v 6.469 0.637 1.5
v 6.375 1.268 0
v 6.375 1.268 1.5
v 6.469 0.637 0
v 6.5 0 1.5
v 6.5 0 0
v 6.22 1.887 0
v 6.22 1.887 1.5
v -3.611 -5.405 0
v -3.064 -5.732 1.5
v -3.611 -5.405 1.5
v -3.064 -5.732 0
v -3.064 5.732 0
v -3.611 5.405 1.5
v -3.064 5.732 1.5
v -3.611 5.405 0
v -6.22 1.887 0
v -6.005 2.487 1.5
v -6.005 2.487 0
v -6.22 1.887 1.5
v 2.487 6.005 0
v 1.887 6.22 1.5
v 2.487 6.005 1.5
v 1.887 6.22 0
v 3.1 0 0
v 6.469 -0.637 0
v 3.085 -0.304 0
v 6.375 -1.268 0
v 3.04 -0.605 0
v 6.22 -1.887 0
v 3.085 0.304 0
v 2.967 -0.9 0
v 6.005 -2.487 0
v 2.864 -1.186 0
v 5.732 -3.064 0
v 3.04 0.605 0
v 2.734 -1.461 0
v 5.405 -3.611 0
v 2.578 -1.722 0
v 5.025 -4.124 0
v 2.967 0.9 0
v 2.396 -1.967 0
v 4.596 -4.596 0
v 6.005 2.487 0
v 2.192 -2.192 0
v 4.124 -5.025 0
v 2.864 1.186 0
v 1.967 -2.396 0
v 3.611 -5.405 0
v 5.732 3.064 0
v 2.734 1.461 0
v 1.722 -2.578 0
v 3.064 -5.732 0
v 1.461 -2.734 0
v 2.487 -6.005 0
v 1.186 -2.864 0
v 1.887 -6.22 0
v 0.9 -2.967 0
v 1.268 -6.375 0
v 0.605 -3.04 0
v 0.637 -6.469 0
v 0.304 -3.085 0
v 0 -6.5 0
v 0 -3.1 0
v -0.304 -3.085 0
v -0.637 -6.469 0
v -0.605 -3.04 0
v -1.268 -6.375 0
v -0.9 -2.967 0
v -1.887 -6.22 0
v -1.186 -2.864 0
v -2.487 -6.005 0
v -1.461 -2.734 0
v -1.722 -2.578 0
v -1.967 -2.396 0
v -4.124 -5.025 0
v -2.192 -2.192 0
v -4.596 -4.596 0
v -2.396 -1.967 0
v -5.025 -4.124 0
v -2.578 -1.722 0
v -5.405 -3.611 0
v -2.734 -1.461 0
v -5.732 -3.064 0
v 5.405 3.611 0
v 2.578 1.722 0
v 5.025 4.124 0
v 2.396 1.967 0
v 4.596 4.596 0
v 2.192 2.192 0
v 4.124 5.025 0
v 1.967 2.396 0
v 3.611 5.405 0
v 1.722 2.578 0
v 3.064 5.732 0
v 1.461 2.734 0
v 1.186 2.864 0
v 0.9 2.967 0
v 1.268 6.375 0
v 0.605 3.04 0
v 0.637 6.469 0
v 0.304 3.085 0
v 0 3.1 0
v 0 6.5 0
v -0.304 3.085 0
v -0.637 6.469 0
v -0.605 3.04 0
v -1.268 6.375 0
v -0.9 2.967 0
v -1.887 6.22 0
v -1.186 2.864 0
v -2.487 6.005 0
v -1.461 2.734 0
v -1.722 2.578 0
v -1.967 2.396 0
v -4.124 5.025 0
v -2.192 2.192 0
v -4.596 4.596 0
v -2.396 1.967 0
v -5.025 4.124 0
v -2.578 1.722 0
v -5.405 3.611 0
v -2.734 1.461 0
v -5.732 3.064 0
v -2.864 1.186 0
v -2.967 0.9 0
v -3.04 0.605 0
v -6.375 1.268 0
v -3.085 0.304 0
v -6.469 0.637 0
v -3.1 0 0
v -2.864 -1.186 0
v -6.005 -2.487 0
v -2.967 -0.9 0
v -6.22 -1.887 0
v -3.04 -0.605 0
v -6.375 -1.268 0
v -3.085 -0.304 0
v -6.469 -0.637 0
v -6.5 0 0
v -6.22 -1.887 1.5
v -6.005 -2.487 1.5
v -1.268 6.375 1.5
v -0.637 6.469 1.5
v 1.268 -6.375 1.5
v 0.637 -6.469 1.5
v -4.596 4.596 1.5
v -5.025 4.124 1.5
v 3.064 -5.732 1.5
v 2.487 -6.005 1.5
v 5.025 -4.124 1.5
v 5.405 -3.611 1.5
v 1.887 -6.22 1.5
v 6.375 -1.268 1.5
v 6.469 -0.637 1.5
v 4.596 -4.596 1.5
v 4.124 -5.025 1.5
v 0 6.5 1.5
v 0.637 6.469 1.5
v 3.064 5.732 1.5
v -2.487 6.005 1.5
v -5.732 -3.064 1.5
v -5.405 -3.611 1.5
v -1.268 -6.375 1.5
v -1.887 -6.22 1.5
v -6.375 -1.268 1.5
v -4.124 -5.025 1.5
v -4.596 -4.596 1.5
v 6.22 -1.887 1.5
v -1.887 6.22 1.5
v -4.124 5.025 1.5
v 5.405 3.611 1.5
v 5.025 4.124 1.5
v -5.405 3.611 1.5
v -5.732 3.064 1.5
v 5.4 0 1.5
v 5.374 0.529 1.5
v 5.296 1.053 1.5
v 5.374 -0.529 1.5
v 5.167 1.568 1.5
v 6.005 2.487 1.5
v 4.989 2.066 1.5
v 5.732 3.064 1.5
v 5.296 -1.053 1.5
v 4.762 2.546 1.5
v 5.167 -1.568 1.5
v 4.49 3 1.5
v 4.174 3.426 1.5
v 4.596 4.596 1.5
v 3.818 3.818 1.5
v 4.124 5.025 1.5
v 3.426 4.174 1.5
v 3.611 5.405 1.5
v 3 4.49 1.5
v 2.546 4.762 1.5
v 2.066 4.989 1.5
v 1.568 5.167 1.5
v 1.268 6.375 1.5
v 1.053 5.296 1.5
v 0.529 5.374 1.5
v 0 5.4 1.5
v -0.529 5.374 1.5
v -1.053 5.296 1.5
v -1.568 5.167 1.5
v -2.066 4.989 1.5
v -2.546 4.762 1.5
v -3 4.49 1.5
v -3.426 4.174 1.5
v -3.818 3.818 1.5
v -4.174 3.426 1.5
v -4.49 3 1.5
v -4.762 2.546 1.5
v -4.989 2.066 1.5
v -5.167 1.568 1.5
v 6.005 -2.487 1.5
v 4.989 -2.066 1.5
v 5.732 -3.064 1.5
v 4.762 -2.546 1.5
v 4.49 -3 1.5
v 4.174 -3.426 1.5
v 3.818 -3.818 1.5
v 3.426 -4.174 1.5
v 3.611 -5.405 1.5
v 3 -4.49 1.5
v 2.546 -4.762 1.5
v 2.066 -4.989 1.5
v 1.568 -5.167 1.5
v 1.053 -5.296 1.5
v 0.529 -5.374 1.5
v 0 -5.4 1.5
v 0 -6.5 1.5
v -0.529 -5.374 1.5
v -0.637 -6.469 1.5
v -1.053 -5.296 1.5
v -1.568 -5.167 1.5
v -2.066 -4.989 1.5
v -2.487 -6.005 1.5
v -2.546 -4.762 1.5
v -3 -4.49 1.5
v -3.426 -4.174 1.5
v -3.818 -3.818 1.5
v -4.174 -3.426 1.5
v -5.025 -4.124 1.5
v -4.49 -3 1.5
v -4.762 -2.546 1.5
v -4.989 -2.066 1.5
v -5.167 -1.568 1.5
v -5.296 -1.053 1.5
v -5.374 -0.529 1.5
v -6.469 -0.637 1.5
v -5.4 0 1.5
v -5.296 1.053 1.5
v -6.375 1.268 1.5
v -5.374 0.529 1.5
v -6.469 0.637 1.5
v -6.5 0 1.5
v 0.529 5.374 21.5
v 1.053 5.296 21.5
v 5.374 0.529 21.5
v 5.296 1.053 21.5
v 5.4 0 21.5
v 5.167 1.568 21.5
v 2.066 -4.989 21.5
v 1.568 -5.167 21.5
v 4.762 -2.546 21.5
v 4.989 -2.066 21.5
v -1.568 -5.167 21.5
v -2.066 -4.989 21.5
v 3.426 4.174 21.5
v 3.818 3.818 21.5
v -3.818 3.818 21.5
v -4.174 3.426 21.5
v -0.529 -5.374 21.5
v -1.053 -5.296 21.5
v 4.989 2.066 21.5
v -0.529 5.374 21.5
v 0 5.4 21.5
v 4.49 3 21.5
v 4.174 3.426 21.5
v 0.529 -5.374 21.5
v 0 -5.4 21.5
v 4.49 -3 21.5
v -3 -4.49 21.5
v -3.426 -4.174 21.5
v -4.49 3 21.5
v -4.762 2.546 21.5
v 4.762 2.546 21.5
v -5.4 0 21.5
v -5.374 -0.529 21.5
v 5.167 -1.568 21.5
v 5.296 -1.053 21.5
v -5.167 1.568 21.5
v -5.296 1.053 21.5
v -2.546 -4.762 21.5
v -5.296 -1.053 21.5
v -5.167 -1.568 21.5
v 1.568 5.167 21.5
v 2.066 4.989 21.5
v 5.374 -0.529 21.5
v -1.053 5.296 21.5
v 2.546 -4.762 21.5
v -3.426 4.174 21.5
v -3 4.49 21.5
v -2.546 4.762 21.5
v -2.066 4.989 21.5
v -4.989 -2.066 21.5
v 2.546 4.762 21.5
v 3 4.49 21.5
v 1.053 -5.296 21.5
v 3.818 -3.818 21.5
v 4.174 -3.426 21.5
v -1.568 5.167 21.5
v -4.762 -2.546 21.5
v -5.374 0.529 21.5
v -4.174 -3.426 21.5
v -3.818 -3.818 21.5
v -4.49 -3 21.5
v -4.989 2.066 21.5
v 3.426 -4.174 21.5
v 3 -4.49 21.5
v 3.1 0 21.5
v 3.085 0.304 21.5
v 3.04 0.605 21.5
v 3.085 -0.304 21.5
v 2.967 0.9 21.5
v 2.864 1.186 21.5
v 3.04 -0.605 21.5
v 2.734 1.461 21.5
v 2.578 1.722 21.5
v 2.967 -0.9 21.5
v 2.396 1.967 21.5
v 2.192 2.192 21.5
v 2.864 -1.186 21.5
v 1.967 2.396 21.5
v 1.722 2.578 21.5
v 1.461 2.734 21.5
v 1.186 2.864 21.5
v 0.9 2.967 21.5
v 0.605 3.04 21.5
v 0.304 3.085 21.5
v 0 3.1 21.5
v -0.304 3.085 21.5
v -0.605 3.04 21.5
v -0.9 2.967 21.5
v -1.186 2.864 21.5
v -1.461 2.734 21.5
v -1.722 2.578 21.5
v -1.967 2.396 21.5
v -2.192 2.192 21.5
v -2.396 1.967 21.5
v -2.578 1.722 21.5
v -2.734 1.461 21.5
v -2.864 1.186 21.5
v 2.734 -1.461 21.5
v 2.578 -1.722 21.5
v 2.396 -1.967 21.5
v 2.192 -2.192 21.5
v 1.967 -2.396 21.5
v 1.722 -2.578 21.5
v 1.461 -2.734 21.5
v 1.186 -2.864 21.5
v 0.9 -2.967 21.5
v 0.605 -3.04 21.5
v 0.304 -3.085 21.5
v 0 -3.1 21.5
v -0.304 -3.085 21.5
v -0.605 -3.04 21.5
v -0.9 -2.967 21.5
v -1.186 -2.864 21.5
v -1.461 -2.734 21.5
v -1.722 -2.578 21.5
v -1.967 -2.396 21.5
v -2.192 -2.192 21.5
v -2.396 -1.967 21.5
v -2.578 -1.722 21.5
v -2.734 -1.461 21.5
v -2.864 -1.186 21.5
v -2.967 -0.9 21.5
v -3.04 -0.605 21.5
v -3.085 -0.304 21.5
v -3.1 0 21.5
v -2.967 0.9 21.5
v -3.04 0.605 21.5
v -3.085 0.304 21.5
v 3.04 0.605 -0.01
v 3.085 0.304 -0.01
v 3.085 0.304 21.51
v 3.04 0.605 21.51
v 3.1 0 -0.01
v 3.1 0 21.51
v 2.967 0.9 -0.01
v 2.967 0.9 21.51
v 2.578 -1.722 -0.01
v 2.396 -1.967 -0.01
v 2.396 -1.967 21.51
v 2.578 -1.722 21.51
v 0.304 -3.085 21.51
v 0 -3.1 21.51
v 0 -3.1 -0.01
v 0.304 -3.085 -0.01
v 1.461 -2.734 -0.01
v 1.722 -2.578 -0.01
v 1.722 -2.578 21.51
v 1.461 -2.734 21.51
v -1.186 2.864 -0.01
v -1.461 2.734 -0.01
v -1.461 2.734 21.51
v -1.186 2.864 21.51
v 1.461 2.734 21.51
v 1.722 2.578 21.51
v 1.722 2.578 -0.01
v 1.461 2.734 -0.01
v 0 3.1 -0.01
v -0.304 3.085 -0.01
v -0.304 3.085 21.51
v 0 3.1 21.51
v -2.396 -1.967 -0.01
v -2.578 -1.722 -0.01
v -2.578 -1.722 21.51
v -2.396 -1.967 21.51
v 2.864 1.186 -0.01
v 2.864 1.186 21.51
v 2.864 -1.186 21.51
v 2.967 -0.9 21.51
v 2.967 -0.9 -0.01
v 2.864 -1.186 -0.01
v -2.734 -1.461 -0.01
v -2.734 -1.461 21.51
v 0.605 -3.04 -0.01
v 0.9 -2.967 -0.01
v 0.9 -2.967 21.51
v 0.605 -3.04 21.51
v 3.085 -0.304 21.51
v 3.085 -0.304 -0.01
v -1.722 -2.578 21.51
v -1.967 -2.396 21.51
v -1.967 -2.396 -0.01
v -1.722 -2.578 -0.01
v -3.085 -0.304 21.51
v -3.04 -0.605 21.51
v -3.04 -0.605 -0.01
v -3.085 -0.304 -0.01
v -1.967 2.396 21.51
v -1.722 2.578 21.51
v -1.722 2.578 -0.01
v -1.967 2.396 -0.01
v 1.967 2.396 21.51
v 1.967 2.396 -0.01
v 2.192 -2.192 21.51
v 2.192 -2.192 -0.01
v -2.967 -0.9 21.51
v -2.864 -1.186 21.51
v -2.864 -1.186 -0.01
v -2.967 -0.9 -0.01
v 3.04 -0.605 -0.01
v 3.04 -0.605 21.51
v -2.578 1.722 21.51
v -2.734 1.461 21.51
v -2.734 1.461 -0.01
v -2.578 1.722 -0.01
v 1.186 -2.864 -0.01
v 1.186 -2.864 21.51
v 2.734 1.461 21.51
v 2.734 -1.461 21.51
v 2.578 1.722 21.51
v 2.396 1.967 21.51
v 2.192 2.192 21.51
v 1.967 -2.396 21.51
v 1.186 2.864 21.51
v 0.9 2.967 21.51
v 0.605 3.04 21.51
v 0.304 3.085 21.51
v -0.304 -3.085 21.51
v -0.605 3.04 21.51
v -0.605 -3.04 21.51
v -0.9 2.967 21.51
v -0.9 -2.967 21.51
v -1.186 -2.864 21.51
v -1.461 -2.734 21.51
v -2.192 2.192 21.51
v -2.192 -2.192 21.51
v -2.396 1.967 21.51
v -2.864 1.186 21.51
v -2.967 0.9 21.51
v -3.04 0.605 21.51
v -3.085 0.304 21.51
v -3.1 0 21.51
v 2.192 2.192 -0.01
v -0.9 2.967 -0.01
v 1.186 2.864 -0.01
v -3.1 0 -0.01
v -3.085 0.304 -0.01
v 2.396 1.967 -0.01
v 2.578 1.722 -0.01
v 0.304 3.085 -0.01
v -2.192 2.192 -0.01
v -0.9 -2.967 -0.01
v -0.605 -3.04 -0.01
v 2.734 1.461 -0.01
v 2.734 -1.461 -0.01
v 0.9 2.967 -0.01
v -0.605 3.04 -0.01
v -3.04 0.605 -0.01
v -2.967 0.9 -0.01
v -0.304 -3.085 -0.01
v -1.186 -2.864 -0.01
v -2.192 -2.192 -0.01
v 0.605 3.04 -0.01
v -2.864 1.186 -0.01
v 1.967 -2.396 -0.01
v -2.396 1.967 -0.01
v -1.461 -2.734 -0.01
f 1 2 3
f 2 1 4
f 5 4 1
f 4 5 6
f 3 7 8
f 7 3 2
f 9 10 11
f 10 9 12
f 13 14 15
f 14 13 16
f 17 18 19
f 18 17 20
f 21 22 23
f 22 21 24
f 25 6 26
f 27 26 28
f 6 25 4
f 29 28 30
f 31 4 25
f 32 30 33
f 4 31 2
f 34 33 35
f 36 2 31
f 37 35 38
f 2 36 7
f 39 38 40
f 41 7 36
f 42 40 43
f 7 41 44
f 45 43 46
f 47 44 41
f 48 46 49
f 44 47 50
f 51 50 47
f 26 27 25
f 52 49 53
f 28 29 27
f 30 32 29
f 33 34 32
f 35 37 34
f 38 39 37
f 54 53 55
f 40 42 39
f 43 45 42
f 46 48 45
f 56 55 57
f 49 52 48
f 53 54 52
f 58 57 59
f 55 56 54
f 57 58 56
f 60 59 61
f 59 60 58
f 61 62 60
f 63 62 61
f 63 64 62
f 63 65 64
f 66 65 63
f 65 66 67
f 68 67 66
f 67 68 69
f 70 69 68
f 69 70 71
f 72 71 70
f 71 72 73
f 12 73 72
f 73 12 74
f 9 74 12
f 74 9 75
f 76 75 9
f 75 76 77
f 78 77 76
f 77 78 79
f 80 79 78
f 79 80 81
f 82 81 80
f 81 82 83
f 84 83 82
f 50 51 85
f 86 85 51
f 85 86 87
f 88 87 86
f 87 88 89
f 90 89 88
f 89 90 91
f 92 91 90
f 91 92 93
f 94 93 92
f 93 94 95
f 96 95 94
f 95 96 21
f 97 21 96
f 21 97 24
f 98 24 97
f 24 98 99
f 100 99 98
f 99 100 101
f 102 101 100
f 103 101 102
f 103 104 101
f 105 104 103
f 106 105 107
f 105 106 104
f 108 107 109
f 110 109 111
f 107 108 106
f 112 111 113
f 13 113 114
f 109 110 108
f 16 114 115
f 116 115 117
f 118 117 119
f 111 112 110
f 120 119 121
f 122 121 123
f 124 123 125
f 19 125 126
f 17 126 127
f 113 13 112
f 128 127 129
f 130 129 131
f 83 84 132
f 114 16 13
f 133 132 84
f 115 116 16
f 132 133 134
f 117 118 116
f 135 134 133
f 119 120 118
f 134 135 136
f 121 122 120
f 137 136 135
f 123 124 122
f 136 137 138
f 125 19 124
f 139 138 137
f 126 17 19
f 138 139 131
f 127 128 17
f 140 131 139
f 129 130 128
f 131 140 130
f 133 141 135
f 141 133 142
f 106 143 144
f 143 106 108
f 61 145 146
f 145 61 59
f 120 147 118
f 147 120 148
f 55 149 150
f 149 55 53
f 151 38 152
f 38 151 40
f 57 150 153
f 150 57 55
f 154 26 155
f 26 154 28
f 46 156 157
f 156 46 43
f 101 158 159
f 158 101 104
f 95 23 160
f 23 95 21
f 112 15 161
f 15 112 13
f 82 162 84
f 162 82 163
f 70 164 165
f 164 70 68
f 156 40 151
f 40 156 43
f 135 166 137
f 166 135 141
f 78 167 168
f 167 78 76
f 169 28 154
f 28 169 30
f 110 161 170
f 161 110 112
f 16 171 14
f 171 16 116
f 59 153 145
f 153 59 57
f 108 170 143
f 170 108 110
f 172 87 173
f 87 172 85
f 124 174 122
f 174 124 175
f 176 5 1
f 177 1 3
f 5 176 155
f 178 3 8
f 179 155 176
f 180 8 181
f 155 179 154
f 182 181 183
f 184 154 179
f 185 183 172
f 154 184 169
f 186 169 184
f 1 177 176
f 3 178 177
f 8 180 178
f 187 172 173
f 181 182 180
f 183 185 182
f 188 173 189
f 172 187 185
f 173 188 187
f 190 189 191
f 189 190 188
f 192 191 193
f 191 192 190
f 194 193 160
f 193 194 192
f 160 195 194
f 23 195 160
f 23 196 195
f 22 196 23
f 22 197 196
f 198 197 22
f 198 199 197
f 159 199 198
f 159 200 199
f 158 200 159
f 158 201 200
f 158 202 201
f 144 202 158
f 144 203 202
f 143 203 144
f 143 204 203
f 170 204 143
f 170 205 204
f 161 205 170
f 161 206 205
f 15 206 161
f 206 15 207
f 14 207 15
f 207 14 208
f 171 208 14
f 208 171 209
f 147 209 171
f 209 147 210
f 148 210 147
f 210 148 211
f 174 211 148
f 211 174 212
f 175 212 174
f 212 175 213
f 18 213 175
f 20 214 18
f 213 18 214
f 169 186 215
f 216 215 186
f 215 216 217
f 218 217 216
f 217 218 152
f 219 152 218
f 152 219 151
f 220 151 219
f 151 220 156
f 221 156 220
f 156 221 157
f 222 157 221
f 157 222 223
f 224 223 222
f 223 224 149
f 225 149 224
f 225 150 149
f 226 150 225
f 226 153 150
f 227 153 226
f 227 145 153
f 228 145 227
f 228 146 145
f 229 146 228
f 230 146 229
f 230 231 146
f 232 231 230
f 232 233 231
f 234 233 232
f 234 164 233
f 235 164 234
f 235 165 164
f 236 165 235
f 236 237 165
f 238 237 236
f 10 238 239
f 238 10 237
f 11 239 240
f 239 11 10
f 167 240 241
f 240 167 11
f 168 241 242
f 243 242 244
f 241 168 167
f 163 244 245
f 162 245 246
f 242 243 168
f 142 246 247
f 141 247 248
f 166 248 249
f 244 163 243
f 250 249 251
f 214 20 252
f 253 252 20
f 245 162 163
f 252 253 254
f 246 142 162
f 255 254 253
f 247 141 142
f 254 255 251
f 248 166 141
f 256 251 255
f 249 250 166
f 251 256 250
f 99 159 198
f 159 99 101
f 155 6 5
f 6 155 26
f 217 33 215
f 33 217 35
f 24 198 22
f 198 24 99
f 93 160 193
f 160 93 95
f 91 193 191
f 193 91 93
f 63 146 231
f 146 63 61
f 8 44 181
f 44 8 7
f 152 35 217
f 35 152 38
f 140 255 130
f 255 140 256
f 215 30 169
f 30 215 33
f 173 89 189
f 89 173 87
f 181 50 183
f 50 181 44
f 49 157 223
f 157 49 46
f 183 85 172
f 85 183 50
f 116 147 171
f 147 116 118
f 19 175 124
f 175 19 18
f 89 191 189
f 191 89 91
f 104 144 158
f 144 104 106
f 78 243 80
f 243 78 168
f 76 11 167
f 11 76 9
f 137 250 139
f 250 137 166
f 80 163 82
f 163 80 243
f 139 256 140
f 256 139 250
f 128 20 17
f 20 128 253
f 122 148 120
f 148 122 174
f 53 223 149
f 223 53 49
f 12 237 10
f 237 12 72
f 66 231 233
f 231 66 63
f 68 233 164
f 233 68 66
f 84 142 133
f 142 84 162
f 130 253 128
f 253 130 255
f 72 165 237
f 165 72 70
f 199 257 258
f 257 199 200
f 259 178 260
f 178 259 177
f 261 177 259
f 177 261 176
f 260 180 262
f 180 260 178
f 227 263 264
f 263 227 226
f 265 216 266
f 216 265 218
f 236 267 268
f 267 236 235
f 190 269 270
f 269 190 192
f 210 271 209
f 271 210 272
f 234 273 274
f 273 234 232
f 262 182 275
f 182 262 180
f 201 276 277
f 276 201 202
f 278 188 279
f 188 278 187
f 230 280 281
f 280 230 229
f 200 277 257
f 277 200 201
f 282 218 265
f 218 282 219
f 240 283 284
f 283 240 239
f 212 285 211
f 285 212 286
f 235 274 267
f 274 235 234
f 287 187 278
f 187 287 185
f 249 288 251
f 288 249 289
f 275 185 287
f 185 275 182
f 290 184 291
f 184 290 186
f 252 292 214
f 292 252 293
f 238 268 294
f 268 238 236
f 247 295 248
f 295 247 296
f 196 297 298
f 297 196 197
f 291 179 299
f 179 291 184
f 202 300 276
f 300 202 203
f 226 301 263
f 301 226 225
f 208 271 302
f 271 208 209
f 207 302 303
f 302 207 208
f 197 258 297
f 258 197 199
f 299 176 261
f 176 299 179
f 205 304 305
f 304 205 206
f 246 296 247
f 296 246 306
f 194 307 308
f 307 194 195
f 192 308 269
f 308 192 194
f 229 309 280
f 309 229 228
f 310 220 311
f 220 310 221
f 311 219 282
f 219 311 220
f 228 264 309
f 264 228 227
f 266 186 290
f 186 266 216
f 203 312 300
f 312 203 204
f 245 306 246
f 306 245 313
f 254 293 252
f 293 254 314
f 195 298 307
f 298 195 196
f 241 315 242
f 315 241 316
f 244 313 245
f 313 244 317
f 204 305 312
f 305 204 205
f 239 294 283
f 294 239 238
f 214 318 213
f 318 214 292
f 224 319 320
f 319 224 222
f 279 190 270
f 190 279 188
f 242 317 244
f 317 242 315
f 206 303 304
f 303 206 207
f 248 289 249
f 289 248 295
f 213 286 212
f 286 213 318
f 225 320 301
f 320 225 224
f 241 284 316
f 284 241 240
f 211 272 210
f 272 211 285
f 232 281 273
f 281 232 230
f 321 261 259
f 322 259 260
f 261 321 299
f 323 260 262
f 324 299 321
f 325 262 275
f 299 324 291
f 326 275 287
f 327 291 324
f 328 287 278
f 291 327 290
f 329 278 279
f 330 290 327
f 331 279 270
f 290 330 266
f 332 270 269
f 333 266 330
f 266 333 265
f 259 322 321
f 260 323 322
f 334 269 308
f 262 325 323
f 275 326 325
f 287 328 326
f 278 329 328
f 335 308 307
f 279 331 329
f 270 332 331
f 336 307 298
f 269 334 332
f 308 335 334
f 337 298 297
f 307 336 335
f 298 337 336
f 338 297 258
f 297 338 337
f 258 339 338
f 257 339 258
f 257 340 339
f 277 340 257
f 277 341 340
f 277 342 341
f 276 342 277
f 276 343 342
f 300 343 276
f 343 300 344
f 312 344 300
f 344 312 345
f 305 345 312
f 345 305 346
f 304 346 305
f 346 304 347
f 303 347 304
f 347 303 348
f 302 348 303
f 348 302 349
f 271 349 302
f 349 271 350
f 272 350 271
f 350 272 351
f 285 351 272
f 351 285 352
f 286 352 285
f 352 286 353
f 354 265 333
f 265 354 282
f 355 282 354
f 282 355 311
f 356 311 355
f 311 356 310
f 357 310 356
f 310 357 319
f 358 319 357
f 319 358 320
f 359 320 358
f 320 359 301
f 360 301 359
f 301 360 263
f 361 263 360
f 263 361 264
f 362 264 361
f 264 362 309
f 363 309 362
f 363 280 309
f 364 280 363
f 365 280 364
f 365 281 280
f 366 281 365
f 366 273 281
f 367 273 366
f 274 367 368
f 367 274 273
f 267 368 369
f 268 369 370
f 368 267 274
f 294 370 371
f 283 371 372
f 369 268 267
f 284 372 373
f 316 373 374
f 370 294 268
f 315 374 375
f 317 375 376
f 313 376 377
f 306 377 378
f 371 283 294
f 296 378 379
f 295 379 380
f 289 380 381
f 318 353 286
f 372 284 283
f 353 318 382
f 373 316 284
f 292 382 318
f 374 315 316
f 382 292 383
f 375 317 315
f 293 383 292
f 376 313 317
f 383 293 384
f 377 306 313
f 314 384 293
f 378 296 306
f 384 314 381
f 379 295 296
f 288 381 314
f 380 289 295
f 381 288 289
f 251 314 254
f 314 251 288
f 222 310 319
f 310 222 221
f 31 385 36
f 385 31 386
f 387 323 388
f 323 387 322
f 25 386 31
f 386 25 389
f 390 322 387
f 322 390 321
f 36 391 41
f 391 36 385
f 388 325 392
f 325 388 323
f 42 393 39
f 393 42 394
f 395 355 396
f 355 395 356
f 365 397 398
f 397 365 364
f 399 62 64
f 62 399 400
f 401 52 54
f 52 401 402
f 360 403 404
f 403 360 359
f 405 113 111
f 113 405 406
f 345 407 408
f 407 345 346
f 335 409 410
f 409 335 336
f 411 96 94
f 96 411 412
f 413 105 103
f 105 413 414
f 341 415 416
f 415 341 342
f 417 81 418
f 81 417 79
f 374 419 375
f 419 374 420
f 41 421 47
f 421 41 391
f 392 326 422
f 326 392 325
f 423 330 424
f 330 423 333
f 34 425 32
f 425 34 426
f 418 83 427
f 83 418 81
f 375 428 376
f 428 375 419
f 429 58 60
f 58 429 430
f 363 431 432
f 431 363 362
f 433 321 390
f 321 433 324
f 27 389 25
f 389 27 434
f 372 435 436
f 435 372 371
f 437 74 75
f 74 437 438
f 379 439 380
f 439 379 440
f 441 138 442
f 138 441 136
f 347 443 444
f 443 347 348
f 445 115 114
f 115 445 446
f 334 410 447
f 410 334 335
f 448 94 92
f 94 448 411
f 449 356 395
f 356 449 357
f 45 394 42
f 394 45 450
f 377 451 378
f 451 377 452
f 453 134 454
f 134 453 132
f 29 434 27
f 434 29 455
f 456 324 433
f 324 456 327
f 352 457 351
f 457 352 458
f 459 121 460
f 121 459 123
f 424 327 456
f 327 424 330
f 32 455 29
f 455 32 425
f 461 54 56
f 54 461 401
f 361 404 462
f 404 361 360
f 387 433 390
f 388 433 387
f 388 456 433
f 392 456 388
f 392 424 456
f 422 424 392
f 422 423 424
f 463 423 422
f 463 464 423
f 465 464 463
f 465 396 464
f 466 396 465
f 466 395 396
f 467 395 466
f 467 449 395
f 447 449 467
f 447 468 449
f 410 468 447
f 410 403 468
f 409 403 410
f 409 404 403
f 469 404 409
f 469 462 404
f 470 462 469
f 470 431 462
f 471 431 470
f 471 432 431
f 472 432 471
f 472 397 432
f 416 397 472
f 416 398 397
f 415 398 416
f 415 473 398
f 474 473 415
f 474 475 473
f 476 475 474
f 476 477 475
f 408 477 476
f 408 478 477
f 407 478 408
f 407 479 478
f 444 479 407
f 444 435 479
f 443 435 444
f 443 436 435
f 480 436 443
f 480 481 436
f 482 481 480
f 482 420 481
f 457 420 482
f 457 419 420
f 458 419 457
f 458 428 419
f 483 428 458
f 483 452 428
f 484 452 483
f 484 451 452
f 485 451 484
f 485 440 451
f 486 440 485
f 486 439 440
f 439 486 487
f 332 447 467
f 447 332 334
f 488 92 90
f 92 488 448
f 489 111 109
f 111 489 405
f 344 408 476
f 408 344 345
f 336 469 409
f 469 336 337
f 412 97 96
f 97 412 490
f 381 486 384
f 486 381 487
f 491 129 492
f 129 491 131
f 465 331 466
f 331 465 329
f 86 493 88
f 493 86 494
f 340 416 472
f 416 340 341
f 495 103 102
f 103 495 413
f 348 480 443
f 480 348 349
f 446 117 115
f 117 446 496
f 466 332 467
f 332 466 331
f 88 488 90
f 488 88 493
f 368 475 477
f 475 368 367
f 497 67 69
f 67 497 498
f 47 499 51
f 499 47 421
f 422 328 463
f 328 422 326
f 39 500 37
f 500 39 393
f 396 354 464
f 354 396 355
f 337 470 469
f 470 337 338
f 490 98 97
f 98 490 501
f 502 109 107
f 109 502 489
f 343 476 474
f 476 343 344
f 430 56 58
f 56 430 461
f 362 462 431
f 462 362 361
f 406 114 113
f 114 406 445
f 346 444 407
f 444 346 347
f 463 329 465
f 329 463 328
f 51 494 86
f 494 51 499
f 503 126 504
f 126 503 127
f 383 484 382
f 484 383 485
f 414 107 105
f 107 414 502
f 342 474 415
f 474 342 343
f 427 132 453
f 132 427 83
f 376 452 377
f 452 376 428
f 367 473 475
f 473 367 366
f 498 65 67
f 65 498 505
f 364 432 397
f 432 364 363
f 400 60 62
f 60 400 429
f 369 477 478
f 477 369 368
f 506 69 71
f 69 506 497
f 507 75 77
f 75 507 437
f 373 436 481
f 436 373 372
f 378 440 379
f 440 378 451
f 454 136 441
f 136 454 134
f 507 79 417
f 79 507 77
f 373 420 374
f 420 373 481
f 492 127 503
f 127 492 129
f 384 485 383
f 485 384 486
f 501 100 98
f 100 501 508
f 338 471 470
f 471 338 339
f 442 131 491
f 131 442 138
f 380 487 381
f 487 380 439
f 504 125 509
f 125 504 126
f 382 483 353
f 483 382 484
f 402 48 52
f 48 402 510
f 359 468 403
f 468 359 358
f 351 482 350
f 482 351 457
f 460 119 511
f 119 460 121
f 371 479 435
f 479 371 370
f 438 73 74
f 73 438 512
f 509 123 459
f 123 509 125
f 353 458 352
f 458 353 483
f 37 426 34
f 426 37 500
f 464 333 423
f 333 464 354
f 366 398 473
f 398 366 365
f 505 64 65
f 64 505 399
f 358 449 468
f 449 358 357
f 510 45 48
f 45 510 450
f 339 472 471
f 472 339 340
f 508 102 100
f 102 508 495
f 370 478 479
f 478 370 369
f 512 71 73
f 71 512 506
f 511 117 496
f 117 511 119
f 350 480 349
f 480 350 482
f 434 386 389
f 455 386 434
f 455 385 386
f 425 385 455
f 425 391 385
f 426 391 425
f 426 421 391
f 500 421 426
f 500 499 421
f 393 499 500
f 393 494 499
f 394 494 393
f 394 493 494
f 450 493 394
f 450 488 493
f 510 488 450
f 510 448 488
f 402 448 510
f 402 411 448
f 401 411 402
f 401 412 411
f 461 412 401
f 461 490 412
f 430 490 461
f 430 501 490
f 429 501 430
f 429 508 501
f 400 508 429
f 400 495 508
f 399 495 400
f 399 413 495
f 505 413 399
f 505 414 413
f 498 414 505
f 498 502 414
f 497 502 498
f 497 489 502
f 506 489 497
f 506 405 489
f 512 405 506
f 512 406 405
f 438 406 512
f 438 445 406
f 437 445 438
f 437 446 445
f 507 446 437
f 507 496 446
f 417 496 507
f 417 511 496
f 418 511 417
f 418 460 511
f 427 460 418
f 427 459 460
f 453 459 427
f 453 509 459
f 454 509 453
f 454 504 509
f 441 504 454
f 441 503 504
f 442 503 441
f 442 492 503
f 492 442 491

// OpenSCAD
// PCR tube adapter sleeve for 0.2 mL tube in 1.5 mL rack hole
// Print upside down: collar on bed, sleeve body upward

// Dimensions
collar_diameter = 13;        // Outer diameter of collar
collar_height = 1.5;        // Height of collar
sleeve_outer_diameter = 10.8; // Outer diameter of sleeve body
sleeve_height = 21.5;       // Total height of sleeve (from collar base)
bore_diameter = 6.2;        // Diameter of central bore

// Main body
union() {
  // Collar
  cylinder(h = collar_height, d = collar_diameter, center = false, $fn = 64);
  
  // Sleeve body
  translate([0, 0, collar_height]) 
    cylinder(h = sleeve_height - collar_height, d = sleeve_outer_diameter, center = false, $fn = 64);
  
  // Central bore
  translate([0, 0, -0.01]) 
    cylinder(h = sleeve_height + 0.02, d = bore_diameter, center = false, $fn = 64);
}
